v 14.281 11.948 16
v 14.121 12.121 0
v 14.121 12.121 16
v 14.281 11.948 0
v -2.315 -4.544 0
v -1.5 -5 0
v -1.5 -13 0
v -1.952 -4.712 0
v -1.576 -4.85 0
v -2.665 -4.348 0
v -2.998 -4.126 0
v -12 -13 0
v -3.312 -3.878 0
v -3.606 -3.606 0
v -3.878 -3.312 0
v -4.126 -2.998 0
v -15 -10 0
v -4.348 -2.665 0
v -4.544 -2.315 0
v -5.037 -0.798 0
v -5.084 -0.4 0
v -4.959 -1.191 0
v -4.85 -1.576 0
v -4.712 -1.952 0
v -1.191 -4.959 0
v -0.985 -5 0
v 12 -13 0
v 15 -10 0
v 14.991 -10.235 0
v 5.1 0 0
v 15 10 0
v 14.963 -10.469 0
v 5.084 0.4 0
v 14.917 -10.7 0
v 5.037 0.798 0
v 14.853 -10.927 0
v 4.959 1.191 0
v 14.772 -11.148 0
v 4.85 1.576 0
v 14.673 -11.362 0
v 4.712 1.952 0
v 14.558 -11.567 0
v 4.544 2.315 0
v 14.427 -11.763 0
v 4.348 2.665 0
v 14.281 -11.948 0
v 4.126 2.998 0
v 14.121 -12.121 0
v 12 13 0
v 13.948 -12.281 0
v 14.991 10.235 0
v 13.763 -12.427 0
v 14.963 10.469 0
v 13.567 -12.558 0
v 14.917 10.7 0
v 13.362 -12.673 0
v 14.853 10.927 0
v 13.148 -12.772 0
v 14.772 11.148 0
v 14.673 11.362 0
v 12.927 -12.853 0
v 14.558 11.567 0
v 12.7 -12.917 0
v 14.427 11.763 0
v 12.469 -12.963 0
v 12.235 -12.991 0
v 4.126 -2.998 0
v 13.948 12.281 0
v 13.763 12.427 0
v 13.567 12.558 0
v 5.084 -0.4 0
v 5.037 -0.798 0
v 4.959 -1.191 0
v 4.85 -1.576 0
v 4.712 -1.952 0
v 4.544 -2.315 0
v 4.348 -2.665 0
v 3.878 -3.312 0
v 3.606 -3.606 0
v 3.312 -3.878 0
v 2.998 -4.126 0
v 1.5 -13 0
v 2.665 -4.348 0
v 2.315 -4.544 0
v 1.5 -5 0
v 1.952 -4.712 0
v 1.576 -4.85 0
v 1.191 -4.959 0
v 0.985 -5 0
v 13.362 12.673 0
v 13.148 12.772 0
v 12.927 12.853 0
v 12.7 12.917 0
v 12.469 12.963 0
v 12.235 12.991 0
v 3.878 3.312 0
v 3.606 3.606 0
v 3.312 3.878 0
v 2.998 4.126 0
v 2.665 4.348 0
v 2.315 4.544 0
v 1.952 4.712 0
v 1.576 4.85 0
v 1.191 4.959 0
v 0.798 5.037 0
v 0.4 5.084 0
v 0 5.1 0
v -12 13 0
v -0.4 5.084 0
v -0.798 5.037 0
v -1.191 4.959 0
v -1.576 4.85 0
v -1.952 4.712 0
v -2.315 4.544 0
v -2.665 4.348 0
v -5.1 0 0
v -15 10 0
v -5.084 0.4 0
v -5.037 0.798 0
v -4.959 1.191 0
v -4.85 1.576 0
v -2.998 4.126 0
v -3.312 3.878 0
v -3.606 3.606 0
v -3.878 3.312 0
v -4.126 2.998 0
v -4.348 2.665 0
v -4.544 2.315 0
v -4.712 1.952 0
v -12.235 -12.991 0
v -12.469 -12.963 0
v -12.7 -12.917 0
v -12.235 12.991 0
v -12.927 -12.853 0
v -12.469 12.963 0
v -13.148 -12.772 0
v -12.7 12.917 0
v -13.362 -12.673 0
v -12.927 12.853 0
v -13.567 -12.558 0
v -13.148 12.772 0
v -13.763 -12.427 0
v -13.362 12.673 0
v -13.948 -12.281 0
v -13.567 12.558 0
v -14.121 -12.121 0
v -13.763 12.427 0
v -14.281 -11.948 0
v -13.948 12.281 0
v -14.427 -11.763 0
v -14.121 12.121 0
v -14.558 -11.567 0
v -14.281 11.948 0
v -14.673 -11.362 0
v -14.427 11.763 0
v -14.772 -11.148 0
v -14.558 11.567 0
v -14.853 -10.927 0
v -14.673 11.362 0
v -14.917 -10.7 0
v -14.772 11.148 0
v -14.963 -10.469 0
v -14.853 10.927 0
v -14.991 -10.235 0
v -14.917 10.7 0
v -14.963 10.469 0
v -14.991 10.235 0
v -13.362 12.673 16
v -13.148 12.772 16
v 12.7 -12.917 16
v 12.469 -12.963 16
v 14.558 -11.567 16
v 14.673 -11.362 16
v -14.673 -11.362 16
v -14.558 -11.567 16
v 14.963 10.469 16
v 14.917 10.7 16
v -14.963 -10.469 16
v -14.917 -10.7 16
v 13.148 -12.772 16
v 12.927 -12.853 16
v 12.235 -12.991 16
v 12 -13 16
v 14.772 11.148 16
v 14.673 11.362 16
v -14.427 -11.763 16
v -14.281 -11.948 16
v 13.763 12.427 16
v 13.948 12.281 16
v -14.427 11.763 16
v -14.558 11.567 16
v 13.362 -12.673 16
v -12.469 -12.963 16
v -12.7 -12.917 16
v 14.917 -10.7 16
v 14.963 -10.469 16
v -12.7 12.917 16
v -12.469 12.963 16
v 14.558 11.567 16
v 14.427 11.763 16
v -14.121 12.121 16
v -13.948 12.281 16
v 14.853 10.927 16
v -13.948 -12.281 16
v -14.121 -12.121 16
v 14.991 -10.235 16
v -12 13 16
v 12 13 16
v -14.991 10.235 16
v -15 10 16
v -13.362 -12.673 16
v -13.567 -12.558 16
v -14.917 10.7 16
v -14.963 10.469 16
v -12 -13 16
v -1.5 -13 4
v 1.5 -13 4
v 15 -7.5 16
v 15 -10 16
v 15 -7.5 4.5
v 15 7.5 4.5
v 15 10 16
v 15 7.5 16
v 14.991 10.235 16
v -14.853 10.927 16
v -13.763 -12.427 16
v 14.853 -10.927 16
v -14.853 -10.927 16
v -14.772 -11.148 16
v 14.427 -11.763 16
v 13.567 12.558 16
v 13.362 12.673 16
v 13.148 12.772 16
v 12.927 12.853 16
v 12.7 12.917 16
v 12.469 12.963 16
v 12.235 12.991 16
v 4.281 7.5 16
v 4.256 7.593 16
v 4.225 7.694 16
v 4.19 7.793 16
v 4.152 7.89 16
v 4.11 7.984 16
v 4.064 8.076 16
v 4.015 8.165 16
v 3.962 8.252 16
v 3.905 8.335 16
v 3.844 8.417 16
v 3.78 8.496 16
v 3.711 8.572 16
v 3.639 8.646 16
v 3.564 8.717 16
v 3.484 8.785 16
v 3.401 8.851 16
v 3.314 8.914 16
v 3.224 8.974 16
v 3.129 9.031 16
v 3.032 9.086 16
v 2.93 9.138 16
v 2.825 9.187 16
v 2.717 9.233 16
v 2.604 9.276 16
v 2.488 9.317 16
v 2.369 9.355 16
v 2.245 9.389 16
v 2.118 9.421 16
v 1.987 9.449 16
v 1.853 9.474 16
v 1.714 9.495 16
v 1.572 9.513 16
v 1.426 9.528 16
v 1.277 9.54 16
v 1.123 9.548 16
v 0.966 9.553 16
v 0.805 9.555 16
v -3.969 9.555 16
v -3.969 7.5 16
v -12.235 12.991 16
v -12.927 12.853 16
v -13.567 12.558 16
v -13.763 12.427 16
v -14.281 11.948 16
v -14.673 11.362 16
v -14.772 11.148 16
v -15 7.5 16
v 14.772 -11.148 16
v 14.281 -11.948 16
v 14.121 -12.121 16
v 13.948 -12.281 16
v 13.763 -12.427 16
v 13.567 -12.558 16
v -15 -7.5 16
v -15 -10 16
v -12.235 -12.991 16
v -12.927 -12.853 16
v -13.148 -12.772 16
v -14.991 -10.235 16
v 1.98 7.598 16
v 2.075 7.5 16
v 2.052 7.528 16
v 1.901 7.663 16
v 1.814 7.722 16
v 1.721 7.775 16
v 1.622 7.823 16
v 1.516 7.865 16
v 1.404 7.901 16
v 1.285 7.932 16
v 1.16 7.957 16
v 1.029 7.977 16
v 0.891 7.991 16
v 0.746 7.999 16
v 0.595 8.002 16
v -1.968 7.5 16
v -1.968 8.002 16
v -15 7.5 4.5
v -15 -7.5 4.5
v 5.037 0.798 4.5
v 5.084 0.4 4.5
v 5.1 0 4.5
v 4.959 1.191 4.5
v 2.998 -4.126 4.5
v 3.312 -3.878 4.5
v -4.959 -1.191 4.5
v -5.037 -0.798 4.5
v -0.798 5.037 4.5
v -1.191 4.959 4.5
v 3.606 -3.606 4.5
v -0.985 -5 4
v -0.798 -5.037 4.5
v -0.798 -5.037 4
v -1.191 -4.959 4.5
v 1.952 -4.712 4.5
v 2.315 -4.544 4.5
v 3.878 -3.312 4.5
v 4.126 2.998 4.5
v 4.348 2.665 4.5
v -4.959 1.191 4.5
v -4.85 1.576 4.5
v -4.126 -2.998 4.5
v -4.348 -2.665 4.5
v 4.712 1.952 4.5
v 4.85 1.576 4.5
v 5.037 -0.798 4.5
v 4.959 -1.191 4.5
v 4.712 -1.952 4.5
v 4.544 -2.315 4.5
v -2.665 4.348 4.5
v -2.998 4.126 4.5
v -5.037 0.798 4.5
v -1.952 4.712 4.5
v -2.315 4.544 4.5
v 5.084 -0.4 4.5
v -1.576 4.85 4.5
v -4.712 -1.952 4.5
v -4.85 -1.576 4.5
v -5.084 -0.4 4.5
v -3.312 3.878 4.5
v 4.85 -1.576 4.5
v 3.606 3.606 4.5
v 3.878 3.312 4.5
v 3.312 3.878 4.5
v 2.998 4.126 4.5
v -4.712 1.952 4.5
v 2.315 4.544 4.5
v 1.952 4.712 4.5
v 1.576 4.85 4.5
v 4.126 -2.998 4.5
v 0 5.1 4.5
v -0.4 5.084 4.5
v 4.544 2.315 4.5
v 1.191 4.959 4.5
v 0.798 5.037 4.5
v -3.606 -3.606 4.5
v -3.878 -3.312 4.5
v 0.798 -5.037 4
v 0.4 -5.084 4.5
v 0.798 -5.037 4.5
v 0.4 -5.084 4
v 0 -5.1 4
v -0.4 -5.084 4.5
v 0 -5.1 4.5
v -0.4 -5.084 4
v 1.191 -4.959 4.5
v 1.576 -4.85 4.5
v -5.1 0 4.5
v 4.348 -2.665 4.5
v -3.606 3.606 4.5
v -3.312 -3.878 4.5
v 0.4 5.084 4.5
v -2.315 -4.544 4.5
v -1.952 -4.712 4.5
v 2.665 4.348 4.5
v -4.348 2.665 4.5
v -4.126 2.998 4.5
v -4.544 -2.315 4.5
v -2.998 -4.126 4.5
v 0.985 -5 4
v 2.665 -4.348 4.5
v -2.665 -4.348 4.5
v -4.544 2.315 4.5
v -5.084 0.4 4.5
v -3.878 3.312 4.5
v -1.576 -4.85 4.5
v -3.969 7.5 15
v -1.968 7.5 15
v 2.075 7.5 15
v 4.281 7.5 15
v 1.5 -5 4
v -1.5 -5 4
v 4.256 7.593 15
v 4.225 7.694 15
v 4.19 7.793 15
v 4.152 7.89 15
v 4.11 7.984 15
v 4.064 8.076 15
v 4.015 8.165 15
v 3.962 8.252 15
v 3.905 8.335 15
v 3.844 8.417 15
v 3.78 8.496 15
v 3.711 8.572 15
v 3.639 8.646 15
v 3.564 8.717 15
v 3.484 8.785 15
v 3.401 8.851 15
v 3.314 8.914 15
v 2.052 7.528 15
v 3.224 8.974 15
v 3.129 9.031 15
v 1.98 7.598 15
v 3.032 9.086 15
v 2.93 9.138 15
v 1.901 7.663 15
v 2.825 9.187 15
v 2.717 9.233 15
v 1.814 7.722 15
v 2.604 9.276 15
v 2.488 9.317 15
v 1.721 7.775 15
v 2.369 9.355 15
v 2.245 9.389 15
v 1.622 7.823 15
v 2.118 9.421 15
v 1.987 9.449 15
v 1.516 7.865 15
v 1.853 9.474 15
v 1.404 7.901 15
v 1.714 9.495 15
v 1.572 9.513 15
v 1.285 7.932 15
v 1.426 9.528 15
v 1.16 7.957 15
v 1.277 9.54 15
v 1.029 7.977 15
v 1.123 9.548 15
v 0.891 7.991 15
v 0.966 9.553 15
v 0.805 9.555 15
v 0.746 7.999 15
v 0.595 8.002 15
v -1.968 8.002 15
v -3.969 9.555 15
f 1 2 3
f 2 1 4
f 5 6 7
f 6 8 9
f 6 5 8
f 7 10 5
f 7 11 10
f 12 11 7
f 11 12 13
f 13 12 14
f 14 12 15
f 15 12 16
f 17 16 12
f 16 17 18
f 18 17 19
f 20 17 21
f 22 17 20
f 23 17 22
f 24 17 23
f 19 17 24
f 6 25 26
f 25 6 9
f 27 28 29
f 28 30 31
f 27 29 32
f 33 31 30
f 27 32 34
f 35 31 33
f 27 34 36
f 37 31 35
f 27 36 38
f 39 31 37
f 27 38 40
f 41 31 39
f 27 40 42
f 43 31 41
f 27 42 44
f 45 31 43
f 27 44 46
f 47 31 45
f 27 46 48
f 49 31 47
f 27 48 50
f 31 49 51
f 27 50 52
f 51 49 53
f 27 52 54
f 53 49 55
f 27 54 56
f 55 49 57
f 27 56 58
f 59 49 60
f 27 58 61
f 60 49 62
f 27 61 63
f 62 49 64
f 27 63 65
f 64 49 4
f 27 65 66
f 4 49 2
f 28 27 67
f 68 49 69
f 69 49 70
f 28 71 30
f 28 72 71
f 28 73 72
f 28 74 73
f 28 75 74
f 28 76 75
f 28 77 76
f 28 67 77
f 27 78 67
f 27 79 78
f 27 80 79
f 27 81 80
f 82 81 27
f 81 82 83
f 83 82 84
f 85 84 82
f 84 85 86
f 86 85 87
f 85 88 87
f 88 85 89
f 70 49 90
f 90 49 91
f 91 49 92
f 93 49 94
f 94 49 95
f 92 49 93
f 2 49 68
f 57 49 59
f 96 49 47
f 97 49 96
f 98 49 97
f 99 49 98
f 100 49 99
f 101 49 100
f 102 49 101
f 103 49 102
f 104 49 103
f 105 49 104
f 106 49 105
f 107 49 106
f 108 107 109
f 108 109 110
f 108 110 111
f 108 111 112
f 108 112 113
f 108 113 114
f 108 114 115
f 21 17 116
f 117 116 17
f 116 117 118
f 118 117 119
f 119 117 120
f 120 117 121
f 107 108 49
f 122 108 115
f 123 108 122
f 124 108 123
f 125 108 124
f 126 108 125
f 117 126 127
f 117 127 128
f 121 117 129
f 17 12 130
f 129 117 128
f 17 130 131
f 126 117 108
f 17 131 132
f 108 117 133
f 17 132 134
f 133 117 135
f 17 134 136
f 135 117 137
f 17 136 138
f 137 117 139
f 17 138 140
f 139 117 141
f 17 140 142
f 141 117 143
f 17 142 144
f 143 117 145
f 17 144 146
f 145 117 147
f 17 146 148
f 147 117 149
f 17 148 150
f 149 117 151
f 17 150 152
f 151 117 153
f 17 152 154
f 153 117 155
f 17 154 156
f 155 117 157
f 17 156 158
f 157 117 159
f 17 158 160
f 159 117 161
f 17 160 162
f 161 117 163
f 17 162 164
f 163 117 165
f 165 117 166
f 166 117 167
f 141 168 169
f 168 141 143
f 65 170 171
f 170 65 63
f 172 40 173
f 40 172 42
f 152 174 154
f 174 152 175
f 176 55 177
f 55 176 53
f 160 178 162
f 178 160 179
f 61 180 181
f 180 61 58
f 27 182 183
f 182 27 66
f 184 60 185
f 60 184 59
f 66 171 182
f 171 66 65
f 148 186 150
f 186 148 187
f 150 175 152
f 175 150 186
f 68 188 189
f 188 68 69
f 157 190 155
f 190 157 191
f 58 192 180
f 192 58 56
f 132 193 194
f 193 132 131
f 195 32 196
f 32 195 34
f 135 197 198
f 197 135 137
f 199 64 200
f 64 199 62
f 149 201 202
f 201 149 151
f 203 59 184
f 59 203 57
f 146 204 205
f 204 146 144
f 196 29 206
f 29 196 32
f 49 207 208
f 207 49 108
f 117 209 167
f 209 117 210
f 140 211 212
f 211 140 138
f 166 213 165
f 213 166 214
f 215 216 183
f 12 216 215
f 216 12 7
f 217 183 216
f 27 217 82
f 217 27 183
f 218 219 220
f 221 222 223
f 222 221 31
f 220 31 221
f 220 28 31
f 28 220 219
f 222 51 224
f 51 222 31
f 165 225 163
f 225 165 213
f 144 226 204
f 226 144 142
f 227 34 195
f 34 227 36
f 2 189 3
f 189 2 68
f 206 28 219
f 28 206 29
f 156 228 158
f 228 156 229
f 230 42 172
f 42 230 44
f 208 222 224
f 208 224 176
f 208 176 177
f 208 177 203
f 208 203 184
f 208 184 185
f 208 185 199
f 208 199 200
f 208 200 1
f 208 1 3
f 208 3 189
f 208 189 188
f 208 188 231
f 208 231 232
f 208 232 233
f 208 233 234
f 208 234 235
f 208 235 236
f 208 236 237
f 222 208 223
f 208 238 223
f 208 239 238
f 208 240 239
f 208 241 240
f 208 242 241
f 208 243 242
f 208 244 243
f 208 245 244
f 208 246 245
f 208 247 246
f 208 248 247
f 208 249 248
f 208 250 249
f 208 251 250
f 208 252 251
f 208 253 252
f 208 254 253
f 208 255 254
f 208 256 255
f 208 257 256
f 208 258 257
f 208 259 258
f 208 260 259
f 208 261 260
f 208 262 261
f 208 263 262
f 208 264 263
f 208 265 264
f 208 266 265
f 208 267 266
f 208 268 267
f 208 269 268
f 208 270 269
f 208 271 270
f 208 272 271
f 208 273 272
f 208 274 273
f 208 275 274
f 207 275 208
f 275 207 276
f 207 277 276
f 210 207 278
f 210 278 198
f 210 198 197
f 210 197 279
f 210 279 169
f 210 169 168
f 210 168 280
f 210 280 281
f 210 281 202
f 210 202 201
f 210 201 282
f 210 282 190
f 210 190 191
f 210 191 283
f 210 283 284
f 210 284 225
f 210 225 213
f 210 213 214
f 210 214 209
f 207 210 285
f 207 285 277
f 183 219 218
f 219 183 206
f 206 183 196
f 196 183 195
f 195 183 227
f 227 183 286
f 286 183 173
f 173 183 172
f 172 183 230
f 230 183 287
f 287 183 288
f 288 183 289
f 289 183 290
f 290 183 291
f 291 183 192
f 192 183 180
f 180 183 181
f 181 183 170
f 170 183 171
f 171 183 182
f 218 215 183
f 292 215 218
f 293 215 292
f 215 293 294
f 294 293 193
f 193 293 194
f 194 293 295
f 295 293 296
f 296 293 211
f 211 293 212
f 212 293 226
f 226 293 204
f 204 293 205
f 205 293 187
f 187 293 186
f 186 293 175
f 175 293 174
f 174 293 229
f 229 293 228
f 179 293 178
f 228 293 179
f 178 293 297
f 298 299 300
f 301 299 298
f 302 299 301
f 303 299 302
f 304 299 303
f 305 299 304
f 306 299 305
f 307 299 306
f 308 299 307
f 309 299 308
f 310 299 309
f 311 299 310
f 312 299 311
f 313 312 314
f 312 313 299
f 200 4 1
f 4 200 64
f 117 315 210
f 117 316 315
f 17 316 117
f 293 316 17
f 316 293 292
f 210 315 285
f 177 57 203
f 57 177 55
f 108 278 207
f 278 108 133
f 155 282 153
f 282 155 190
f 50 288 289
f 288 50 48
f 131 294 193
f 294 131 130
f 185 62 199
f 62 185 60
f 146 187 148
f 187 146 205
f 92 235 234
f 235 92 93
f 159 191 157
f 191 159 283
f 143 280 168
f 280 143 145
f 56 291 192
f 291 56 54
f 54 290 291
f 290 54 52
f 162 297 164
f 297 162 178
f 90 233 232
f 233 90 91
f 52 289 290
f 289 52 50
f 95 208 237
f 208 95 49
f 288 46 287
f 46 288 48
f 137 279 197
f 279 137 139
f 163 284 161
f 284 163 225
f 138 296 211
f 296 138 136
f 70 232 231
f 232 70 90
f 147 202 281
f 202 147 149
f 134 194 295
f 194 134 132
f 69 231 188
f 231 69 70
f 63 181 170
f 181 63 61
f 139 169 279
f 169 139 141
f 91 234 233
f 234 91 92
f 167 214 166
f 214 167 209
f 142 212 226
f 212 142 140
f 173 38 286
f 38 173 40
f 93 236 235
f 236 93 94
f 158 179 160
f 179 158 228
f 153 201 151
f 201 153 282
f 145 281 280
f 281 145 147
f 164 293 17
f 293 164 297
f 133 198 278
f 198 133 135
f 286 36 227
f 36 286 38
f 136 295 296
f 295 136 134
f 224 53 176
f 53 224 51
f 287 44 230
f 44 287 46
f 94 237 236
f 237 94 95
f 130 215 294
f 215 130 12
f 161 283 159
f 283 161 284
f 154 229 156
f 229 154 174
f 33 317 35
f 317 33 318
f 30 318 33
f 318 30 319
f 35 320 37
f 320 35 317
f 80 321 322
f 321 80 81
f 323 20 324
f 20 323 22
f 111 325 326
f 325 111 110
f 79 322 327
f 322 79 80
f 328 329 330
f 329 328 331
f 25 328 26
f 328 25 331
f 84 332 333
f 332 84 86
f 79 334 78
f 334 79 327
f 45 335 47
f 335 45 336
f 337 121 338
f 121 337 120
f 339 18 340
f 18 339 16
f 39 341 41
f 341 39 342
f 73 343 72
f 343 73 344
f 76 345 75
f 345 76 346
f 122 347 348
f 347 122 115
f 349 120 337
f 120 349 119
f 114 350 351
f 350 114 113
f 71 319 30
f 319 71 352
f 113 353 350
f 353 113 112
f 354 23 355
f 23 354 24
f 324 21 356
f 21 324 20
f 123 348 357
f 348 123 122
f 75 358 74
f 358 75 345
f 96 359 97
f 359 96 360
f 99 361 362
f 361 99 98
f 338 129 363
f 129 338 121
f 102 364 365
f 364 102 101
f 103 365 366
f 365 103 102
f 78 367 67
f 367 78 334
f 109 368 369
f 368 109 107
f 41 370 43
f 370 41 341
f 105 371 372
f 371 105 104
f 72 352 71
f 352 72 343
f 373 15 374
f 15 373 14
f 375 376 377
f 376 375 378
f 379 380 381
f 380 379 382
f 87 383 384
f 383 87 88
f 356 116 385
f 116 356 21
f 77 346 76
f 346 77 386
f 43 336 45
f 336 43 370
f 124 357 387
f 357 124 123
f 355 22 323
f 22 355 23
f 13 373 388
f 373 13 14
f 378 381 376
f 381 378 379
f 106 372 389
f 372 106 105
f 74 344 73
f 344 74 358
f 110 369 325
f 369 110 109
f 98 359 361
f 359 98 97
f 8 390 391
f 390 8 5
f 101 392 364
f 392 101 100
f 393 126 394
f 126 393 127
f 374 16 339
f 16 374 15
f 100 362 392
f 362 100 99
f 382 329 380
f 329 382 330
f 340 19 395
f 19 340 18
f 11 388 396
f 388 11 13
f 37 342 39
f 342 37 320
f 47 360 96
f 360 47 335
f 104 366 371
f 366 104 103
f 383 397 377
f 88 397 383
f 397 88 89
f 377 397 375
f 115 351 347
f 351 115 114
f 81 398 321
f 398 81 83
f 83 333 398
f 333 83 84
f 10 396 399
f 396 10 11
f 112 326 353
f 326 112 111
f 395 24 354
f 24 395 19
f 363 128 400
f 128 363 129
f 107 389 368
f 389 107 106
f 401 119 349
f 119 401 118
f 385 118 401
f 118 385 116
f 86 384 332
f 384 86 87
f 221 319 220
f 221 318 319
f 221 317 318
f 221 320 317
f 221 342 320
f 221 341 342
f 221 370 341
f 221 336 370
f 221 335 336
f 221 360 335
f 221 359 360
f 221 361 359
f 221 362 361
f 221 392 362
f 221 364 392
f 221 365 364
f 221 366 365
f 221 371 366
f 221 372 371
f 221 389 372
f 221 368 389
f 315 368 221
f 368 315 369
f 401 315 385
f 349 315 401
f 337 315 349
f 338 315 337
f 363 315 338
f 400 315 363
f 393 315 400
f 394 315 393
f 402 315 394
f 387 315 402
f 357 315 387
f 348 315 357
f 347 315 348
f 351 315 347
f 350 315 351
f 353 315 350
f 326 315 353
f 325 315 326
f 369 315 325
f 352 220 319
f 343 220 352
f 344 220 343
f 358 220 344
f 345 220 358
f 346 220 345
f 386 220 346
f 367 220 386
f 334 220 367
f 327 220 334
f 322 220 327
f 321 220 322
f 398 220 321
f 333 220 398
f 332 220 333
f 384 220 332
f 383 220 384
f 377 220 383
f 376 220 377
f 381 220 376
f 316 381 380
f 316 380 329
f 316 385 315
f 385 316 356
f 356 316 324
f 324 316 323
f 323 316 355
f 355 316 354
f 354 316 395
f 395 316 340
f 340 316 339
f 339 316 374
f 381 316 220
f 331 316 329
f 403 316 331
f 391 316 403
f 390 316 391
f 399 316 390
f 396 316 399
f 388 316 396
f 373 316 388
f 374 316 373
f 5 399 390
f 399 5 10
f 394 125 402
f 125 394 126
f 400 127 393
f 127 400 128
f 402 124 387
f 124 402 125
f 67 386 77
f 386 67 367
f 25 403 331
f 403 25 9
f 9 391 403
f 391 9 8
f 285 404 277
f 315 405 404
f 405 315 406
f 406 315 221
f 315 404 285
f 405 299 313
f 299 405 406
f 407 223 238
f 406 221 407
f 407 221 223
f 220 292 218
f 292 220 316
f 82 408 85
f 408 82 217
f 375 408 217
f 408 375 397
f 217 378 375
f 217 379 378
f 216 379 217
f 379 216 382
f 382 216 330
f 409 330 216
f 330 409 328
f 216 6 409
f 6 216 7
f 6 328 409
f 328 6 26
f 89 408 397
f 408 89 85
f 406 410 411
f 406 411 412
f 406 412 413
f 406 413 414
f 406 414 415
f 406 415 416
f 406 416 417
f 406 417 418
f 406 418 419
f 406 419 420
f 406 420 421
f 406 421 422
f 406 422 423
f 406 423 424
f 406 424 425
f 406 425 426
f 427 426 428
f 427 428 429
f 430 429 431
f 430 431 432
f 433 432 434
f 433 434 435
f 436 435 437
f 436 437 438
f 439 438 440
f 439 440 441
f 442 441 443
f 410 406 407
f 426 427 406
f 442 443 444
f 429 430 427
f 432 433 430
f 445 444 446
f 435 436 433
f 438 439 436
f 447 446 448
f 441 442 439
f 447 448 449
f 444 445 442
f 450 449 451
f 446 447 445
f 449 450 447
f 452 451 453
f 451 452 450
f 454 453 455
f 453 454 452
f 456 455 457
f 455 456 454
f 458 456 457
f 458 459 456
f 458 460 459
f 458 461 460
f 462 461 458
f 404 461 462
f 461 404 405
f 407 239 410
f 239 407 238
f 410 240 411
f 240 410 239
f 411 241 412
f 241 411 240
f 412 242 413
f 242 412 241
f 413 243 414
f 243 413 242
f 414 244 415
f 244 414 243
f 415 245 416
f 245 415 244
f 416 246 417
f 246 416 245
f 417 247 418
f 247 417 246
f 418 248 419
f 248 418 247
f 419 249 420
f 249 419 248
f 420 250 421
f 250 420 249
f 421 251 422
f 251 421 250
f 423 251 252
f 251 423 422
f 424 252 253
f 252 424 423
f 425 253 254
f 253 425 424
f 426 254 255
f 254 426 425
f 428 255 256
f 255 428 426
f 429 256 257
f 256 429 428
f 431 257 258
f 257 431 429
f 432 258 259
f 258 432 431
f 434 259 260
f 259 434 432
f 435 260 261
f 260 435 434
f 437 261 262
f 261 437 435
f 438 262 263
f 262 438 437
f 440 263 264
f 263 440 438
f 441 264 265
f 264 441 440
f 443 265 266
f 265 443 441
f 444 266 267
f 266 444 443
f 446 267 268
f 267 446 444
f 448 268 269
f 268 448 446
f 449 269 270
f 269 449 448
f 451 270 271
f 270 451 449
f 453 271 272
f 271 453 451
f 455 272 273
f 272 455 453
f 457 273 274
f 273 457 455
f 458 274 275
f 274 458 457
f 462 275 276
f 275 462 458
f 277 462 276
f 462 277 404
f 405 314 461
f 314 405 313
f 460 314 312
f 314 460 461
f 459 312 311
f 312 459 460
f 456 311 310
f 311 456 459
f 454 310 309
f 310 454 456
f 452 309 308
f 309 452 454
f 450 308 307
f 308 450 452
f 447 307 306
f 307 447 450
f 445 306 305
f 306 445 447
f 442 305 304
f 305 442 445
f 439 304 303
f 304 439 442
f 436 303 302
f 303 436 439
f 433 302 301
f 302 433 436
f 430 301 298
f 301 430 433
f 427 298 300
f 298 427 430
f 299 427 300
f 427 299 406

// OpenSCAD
// V54-Right Pacer Saddle
// Force-cut version for VG1030001XH

$fn = 80;

difference() {
    // 1. THE OUTER BOX (Rounded for comfort)
    hull() {
        translate([-12, -10, 0]) cylinder(r=3, h=16);
        translate([12, -10, 0])  cylinder(r=3, h=16);
        translate([-12, 10, 0])  cylinder(r=3, h=16);
        translate([12, 10, 0])   cylinder(r=3, h=16);
    }

    // 2. THE MOTOR HOLE (Skin-Side)
    // This creates the "Open" part for the motor
    translate([0, 0, -1]) 
        cylinder(d=10.2, h=5.5);

    // 3. THE CLIPS (The big "C" slot for the earphones)
    // This is how it secures to the battery pod
    translate([-20, -7.5, 4.5]) 
        cube([40, 15, 15]); 

    // 4. WIRE EXIT
    translate([0, -15, 1.5]) 
        cube([3, 20, 5], center=true);

    // 5. TACTILE "R"
    translate([0, 0, 15]) 
        linear_extrude(height = 3) 
            text("R", size=10, font="Arial:style=Bold", halign="center");
}
